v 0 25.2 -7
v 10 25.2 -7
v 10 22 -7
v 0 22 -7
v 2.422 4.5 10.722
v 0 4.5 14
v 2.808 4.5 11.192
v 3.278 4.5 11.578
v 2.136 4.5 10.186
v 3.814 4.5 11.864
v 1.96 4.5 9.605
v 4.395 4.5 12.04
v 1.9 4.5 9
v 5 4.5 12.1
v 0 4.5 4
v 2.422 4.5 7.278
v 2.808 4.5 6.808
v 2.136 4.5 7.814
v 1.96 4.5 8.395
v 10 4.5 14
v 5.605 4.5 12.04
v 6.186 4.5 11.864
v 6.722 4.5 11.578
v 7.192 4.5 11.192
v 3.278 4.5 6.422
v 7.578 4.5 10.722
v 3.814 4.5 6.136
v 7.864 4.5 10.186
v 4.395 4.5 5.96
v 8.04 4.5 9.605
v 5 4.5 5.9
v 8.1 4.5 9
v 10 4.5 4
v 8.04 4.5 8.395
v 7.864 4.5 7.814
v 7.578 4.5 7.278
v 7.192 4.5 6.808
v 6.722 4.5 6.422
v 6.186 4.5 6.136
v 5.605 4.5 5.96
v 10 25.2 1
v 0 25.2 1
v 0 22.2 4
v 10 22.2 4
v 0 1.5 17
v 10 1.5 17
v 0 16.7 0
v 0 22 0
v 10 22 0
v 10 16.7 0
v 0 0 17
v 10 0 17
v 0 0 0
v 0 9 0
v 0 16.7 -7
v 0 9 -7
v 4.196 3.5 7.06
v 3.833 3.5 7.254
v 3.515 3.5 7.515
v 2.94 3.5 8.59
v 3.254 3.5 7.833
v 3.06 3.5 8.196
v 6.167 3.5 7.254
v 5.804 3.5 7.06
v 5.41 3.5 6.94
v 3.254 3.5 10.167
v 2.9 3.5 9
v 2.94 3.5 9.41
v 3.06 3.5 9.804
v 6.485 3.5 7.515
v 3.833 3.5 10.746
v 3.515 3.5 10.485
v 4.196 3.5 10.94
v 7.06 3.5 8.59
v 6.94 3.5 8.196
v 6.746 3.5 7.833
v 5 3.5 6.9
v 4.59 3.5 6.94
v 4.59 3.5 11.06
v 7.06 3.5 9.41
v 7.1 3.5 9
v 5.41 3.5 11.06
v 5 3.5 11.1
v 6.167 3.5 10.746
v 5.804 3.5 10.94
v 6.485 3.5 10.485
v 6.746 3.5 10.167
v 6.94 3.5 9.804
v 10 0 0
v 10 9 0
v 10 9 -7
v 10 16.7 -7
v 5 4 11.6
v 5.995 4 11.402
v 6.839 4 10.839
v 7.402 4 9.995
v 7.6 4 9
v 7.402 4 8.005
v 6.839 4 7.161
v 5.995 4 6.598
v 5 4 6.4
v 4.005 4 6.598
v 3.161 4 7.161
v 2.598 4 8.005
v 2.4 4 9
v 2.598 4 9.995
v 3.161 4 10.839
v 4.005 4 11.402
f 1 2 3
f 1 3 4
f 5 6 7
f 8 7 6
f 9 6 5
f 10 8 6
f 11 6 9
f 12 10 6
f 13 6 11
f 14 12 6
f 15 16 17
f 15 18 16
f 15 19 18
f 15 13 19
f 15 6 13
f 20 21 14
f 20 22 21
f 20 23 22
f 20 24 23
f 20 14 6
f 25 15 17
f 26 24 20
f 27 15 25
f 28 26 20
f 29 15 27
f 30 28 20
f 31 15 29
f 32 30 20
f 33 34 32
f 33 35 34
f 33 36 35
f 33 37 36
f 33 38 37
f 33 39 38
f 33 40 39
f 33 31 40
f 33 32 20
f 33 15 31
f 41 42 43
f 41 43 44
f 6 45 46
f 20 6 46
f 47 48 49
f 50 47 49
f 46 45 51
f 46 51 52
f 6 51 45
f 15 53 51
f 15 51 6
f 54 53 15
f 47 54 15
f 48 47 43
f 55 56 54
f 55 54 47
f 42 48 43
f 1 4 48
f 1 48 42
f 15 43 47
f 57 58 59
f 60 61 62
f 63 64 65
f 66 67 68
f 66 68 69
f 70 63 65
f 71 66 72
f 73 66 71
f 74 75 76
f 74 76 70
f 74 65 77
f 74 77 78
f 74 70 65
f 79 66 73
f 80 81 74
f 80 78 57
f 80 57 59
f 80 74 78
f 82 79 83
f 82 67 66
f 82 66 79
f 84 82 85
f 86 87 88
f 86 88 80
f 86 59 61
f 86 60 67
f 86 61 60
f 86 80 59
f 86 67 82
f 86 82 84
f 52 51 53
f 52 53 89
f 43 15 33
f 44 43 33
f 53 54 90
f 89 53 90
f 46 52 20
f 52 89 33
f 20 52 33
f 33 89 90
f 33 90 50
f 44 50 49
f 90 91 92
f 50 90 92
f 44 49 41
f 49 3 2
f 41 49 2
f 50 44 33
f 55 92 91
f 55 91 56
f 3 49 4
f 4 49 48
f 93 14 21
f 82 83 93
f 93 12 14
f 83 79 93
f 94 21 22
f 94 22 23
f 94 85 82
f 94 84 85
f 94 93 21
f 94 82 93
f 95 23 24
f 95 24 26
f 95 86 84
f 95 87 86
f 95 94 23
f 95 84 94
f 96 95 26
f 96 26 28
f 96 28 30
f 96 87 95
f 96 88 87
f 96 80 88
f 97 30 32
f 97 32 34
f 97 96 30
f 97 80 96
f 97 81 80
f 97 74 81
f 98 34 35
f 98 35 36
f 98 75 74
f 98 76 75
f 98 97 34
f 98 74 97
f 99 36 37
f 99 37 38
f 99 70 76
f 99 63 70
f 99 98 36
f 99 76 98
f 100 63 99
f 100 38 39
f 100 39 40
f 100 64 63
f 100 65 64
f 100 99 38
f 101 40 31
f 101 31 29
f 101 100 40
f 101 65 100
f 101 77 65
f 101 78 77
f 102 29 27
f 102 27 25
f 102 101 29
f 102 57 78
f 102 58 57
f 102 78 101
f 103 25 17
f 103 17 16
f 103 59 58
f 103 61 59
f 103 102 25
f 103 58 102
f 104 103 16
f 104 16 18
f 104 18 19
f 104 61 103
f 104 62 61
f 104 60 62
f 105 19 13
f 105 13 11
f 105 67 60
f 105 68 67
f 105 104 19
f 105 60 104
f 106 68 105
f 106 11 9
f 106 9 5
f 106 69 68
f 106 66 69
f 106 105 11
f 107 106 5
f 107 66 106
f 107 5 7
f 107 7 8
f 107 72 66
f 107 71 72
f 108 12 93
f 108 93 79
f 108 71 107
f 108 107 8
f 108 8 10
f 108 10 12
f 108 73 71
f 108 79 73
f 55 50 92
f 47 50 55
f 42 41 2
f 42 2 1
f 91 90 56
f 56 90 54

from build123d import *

# Parameters (mm, degrees)
SKETCH1_W           = 10
SKETCH1_H           = 25.2
BOSS_EXTRUDE1_DEPTH = 4
SKETCH2_W           = 10
SKETCH2_H           = 3.2
SKETCH2_H_2         = 7.7
BOSS_EXTRUDE2_DEPTH = 7
SKETCH3_W           = 10
SKETCH3_H           = 4.5
BOSS_EXTRUDE3_DEPTH = 13
SKETCH4_R           = 3.1
CUT_EXTRUDE2_DEPTH  = 1
CHAMFER2_SIZE       = 1
CHAMFER3_SIZE       = 3


with BuildPart() as part:
    # Sketch1 → Boss-Extrude1 (new body)
    with BuildSketch(Plane.XY):
        with Locations((5, 12.6)):
            Rectangle(SKETCH1_W, SKETCH1_H)
    extrude(amount=BOSS_EXTRUDE1_DEPTH)

    # Sketch2 → Boss-Extrude2 (add)
    with BuildSketch(Plane(origin=(0, 0, 0), x_dir=(-1, 0, 0), z_dir=(0, 0, -1))):
        with Locations((-5, 23.6)):
            Rectangle(SKETCH2_W, SKETCH2_H)
        with Locations((-5, 12.85)):
            Rectangle(SKETCH2_W, SKETCH2_H_2)
    extrude(amount=BOSS_EXTRUDE2_DEPTH)

    # Sketch3 → Boss-Extrude3 (add)
    with BuildSketch(Plane.XY.offset(4)):
        with Locations((5, 2.25)):
            Rectangle(SKETCH3_W, SKETCH3_H)
    extrude(amount=BOSS_EXTRUDE3_DEPTH)

    # Sketch4 → Cut-Extrude2 (cut)
    with BuildSketch(Plane(origin=(0, 4.5, 0), x_dir=(1, 0, 0), z_dir=(0, 1, 0))):
        with Locations(Location((5, -9, 0), (0, 0, 270))):
            Circle(SKETCH4_R)
    extrude(amount=-CUT_EXTRUDE2_DEPTH, mode=Mode.SUBTRACT)

    # Chamfer2
    chamfer2_edges = [part.edges().sort_by_distance(p)[0] for p in [
        (5, 3.5, 5.9),
    ]]
    chamfer(chamfer2_edges, length=CHAMFER2_SIZE - 0.0001)  # a hair under: the kernel refuses the full size

    # Chamfer3
    chamfer3_edges = [part.edges().sort_by_distance(p)[0] for p in [
        (5, 25.2, 4),
        (5, 4.5, 17),
    ]]
    chamfer(chamfer3_edges, length=CHAMFER3_SIZE)


solid = part.part
